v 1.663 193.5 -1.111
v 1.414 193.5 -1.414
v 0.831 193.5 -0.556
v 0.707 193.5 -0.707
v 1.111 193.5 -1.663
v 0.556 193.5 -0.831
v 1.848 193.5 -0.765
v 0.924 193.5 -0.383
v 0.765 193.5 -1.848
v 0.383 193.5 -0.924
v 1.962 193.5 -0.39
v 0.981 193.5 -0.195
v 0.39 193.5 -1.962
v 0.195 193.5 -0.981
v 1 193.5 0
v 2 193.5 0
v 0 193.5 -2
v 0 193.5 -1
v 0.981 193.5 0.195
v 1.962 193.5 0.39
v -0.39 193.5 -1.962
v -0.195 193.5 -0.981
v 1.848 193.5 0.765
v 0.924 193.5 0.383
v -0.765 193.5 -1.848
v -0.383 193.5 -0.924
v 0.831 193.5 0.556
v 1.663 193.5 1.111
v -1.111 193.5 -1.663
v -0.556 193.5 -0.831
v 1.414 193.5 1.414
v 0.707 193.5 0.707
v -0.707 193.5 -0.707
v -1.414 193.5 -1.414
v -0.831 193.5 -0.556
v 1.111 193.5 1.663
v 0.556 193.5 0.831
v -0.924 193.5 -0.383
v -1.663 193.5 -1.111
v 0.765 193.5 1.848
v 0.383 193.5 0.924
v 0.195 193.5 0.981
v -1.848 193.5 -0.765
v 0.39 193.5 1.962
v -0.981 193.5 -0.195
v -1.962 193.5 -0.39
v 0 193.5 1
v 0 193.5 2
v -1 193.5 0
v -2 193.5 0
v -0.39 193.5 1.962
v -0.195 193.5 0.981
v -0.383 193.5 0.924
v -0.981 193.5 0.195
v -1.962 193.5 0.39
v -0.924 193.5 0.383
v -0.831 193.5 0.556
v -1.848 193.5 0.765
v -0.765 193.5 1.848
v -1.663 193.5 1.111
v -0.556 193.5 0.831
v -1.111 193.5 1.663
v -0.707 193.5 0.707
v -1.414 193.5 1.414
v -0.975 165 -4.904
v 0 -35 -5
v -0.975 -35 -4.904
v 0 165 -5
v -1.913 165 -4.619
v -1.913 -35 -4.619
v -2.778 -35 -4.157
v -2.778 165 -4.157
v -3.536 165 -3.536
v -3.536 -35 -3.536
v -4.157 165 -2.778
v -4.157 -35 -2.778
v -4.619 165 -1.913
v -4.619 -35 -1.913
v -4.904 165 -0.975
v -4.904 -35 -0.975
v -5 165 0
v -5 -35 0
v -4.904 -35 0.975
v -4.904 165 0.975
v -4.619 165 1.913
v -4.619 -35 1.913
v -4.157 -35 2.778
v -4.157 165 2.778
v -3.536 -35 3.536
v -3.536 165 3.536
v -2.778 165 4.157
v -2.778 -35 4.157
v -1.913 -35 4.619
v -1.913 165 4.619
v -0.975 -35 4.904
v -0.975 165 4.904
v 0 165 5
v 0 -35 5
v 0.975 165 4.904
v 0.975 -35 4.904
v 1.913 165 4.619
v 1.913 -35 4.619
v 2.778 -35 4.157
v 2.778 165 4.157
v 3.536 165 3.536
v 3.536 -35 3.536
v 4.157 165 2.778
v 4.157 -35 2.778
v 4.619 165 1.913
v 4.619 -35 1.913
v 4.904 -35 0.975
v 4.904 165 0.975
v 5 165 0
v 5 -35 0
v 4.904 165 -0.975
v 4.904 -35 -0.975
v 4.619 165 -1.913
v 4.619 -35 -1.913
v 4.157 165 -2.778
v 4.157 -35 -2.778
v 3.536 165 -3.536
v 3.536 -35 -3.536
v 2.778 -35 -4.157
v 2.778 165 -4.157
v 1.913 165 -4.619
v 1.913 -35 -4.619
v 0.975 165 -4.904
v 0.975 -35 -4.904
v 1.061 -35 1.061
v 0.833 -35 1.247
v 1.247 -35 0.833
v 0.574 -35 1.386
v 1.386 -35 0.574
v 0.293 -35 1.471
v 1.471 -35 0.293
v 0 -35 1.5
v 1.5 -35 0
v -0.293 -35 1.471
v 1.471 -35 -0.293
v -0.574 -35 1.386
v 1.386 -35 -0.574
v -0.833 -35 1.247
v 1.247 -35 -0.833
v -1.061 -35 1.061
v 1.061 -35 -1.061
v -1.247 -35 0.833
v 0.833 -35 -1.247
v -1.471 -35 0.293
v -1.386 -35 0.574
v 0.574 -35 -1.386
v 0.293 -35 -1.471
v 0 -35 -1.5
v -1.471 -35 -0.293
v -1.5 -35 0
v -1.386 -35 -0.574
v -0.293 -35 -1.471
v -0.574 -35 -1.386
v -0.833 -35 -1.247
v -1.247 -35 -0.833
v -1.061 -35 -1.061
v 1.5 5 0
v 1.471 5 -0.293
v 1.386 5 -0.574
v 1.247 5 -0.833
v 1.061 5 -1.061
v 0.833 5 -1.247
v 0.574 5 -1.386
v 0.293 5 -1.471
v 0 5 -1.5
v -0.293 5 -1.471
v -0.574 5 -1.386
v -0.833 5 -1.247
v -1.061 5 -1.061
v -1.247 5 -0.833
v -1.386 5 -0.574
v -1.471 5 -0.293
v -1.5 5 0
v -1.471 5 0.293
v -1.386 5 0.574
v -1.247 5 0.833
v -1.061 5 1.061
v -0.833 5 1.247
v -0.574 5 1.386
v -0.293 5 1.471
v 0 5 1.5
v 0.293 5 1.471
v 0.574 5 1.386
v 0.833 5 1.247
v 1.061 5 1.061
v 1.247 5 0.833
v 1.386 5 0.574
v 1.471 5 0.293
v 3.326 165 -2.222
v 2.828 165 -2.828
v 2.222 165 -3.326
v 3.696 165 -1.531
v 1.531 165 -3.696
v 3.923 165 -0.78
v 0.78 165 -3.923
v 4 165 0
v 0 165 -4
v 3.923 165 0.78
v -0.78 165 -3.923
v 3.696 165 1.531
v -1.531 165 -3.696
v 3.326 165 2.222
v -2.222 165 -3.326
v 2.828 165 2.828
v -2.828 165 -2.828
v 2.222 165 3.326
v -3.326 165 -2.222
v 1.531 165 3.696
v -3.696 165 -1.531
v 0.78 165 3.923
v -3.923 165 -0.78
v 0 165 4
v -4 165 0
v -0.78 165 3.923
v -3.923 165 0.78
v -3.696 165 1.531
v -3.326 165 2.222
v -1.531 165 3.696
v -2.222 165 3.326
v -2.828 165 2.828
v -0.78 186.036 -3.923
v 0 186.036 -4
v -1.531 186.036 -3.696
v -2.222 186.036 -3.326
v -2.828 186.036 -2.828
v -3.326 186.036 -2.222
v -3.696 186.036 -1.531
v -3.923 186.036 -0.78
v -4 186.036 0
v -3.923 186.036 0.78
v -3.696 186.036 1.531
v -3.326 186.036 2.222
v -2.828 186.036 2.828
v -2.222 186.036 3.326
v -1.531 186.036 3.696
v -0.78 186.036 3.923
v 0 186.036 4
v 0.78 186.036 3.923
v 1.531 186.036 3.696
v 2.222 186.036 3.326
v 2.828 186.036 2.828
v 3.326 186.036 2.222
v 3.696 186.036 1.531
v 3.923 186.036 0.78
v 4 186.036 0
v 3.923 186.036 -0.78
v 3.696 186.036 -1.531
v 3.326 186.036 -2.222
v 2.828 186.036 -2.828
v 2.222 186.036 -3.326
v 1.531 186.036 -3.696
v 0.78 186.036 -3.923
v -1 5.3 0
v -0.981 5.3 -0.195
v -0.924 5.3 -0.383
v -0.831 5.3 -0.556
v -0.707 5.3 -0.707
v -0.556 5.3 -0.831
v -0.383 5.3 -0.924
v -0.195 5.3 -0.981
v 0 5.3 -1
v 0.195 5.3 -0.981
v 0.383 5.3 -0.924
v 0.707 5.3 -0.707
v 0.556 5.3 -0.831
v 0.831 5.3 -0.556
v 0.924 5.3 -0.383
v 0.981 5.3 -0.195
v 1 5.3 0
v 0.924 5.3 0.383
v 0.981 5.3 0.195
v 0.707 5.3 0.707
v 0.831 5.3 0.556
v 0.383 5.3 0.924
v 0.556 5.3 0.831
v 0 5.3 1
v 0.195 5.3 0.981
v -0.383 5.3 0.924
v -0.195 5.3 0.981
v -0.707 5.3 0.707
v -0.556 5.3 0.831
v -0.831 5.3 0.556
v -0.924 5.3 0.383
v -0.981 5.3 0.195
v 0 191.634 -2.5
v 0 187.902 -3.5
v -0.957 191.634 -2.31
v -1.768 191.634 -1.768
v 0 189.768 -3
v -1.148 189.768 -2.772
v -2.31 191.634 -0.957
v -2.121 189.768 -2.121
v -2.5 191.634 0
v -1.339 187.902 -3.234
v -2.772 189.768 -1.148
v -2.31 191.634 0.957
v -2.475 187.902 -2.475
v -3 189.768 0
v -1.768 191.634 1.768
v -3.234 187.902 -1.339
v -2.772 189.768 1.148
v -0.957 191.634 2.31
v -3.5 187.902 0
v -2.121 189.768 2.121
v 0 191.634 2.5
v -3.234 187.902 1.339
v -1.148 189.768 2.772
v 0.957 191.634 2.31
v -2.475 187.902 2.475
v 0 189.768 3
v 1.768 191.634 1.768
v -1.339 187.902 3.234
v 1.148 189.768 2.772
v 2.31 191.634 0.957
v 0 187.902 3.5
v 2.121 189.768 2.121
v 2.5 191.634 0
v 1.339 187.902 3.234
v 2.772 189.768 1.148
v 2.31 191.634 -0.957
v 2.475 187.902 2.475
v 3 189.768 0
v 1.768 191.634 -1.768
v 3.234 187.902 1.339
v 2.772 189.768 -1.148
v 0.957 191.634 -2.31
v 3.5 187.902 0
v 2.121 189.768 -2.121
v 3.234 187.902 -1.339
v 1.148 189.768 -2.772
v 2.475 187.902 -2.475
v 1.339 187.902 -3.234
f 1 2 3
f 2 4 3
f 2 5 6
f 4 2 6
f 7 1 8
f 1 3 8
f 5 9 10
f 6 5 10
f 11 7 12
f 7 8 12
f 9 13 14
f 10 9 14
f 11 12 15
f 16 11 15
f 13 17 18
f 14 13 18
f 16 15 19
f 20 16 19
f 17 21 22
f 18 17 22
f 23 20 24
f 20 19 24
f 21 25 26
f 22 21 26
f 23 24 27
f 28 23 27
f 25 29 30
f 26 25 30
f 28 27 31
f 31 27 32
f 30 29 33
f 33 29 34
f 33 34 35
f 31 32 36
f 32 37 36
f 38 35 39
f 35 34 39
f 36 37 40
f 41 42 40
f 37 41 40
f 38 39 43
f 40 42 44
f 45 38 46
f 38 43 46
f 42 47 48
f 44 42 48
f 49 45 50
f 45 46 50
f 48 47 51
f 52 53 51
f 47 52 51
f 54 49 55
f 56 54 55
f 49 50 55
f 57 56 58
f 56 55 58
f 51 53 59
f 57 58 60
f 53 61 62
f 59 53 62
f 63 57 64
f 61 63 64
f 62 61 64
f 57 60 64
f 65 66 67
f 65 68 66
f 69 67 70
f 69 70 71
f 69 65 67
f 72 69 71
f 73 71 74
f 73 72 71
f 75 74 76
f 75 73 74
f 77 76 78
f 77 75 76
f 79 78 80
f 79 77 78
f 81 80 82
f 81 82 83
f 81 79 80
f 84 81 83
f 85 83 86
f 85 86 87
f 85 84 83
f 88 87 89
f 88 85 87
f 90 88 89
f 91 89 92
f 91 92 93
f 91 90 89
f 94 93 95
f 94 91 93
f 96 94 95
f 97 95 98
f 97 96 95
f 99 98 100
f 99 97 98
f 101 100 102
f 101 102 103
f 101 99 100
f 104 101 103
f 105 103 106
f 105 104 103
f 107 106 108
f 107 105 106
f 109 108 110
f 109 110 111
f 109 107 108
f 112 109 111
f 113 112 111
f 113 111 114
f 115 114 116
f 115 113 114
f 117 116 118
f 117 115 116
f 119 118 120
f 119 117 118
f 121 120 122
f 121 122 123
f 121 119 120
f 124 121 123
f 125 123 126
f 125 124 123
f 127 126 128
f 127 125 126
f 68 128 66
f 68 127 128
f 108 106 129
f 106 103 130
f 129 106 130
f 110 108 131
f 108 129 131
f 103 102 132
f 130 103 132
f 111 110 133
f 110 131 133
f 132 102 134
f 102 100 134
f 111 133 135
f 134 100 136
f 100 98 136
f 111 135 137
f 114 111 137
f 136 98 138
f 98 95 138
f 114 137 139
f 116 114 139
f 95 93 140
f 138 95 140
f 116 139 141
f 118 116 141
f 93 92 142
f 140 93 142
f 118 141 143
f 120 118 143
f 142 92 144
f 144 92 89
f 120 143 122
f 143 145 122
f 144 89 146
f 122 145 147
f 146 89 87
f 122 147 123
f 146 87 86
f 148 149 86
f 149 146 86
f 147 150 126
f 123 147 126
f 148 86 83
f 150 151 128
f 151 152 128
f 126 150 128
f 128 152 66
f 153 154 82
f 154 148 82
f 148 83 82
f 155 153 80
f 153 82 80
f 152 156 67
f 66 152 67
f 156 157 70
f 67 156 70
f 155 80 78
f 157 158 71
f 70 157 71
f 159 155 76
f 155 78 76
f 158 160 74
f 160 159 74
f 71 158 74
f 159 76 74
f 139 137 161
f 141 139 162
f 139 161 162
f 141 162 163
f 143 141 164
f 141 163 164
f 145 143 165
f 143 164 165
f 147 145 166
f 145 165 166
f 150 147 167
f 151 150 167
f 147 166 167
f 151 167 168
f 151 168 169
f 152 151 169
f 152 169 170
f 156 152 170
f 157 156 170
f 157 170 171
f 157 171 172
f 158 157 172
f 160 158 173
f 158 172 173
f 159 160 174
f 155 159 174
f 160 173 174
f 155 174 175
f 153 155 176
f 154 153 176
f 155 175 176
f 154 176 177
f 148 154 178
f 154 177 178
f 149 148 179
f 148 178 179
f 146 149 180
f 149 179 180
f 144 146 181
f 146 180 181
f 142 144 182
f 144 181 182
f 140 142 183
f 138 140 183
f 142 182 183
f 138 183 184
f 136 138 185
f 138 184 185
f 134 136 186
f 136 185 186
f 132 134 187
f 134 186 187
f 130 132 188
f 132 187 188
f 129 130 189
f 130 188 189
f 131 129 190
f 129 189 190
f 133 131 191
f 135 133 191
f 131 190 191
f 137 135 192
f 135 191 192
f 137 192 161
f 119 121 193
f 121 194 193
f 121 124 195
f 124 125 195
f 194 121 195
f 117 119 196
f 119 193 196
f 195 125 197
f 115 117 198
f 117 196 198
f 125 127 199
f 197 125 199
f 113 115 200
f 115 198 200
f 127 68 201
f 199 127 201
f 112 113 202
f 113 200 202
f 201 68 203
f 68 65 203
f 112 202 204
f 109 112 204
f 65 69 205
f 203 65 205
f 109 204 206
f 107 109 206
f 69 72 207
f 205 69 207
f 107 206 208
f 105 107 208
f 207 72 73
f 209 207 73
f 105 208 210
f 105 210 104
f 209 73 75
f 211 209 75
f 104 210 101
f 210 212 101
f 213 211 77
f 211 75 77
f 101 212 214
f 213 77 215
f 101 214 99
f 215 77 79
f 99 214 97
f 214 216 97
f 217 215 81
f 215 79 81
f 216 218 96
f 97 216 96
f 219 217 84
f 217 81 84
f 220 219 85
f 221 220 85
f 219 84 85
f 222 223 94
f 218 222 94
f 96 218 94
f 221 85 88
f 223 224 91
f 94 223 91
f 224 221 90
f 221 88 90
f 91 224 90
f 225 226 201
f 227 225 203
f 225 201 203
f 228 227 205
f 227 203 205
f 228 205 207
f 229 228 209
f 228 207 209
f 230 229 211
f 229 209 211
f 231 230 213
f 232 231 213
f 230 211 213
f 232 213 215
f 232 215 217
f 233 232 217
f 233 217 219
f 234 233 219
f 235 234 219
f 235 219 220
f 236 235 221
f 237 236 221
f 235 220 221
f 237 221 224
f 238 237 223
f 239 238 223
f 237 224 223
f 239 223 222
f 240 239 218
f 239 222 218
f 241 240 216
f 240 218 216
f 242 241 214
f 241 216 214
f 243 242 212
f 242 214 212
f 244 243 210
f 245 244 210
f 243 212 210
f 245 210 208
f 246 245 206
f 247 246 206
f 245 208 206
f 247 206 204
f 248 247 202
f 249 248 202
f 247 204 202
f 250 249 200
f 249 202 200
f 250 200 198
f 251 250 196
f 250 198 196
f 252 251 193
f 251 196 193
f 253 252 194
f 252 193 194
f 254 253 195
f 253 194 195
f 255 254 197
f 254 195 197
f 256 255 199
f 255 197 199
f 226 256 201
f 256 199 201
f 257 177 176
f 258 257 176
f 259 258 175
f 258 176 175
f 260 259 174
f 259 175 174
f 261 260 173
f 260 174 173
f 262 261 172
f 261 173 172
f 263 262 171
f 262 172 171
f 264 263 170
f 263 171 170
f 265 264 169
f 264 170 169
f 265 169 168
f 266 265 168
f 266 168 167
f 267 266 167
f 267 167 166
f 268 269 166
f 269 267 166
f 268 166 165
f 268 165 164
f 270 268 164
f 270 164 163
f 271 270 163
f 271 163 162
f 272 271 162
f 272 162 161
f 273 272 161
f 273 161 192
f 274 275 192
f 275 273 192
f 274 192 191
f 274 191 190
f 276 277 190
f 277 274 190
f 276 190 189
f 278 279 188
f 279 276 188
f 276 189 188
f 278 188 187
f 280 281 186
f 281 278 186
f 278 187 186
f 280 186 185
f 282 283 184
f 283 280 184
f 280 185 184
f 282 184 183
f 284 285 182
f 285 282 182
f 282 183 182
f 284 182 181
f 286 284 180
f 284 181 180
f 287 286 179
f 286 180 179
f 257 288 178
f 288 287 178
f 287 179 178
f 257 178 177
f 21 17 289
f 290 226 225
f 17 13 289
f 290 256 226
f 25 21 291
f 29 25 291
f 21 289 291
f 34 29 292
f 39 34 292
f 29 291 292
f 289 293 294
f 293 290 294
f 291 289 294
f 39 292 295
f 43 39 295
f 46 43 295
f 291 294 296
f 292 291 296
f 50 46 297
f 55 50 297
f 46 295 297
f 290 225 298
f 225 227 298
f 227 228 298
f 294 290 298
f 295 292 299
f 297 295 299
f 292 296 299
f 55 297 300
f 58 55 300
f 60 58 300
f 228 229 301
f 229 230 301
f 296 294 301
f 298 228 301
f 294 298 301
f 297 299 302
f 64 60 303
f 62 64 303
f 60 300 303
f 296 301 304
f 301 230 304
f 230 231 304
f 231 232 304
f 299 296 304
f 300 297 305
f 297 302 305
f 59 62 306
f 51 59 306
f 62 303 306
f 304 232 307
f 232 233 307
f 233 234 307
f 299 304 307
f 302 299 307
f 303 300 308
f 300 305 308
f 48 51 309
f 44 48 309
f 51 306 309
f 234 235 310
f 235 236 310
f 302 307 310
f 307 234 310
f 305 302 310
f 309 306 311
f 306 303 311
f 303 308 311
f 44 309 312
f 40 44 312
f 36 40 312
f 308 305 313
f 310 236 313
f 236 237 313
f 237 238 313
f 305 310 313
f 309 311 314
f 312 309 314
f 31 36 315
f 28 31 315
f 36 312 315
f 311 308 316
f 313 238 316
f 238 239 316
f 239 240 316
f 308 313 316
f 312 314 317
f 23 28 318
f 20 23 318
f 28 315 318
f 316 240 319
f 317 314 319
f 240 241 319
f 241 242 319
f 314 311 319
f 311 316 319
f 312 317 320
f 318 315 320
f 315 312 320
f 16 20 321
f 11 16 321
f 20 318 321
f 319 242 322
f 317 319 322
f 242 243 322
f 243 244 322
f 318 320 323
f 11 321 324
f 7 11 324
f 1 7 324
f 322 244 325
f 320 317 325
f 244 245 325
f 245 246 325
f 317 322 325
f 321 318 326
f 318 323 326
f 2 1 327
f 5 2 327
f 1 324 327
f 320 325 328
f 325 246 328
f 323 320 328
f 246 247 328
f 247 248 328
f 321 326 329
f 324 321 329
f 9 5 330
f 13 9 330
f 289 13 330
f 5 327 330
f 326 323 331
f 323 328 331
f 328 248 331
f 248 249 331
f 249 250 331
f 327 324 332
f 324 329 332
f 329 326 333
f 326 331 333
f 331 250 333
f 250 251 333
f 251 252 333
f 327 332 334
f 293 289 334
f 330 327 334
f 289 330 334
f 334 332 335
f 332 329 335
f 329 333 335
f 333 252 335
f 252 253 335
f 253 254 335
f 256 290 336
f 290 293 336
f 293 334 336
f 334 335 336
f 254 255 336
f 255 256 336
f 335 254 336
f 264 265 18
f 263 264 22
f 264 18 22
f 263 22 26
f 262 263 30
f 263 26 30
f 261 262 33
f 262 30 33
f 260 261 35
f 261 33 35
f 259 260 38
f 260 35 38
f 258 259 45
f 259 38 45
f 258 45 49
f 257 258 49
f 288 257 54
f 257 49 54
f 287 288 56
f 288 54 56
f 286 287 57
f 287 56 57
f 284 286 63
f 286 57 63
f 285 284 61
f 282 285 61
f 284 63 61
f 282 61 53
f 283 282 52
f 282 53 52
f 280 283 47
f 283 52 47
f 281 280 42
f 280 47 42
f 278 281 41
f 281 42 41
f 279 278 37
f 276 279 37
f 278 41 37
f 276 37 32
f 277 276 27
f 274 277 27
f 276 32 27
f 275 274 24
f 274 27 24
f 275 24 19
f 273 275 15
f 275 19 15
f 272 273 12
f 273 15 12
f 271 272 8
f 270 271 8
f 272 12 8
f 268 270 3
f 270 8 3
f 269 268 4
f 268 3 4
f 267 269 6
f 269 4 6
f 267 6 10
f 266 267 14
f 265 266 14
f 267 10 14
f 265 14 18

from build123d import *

# Parameters (mm, degrees)
DIAM_TRE_DU_PER_AGE_3_0_3_1_D     = 3
DIAM_TRE_DU_PER_AGE_3_0_3_1_DEPTH = 40
DIAM_TRE_DU_PER_AGE_3_0_3_1_TIP   = 0.901290929
CHANFREIN1_SIZE                   = 2
CHANFREIN1_SIZE2                  = 7.464101615


with BuildPart() as part:
    # Esquisse1 → Révolution1 (revolve)
    with BuildSketch(Plane.XY, mode=Mode.PRIVATE) as r_volution1_sk:
        Polygon((1, -35), (1, 193.5), (4, 193.5), (4, 165), (5, 165), (5, 20), (5, -35), align=None)
    revolve(r_volution1_sk.sketch.rotate(Axis((0, 0, 0), (0, 1, 0)), 90), axis=Axis((0, 0, 0), (0, 1, 0)))

    # Diamètre du perçage Ø3.0 (3)1
    with Locations(Plane(origin=(0, -35, 0), x_dir=(-1, 0, 0), z_dir=(0, -1, 0))):
        with Locations((0, 0)):
            Hole(DIAM_TRE_DU_PER_AGE_3_0_3_1_D / 2, depth=DIAM_TRE_DU_PER_AGE_3_0_3_1_DEPTH)
            with Locations((0, 0, -(DIAM_TRE_DU_PER_AGE_3_0_3_1_DEPTH + DIAM_TRE_DU_PER_AGE_3_0_3_1_TIP / 2))):  # 118° drill point
                Cone(0, DIAM_TRE_DU_PER_AGE_3_0_3_1_D / 2, DIAM_TRE_DU_PER_AGE_3_0_3_1_TIP, mode=Mode.SUBTRACT)

    # Chanfrein1
    chanfrein1_edges = [part.edges().sort_by_distance(p)[0] for p in [
        (0, 193.5, 4),
    ]]
    chanfrein1_side = [part.faces().sort_by_distance(p)[0] for p in [
        (0, 193.5, 1.113137085),
    ]]
    chamfer(chanfrein1_edges, length=CHANFREIN1_SIZE, length2=CHANFREIN1_SIZE2, reference=chanfrein1_side[0])


solid = part.part
